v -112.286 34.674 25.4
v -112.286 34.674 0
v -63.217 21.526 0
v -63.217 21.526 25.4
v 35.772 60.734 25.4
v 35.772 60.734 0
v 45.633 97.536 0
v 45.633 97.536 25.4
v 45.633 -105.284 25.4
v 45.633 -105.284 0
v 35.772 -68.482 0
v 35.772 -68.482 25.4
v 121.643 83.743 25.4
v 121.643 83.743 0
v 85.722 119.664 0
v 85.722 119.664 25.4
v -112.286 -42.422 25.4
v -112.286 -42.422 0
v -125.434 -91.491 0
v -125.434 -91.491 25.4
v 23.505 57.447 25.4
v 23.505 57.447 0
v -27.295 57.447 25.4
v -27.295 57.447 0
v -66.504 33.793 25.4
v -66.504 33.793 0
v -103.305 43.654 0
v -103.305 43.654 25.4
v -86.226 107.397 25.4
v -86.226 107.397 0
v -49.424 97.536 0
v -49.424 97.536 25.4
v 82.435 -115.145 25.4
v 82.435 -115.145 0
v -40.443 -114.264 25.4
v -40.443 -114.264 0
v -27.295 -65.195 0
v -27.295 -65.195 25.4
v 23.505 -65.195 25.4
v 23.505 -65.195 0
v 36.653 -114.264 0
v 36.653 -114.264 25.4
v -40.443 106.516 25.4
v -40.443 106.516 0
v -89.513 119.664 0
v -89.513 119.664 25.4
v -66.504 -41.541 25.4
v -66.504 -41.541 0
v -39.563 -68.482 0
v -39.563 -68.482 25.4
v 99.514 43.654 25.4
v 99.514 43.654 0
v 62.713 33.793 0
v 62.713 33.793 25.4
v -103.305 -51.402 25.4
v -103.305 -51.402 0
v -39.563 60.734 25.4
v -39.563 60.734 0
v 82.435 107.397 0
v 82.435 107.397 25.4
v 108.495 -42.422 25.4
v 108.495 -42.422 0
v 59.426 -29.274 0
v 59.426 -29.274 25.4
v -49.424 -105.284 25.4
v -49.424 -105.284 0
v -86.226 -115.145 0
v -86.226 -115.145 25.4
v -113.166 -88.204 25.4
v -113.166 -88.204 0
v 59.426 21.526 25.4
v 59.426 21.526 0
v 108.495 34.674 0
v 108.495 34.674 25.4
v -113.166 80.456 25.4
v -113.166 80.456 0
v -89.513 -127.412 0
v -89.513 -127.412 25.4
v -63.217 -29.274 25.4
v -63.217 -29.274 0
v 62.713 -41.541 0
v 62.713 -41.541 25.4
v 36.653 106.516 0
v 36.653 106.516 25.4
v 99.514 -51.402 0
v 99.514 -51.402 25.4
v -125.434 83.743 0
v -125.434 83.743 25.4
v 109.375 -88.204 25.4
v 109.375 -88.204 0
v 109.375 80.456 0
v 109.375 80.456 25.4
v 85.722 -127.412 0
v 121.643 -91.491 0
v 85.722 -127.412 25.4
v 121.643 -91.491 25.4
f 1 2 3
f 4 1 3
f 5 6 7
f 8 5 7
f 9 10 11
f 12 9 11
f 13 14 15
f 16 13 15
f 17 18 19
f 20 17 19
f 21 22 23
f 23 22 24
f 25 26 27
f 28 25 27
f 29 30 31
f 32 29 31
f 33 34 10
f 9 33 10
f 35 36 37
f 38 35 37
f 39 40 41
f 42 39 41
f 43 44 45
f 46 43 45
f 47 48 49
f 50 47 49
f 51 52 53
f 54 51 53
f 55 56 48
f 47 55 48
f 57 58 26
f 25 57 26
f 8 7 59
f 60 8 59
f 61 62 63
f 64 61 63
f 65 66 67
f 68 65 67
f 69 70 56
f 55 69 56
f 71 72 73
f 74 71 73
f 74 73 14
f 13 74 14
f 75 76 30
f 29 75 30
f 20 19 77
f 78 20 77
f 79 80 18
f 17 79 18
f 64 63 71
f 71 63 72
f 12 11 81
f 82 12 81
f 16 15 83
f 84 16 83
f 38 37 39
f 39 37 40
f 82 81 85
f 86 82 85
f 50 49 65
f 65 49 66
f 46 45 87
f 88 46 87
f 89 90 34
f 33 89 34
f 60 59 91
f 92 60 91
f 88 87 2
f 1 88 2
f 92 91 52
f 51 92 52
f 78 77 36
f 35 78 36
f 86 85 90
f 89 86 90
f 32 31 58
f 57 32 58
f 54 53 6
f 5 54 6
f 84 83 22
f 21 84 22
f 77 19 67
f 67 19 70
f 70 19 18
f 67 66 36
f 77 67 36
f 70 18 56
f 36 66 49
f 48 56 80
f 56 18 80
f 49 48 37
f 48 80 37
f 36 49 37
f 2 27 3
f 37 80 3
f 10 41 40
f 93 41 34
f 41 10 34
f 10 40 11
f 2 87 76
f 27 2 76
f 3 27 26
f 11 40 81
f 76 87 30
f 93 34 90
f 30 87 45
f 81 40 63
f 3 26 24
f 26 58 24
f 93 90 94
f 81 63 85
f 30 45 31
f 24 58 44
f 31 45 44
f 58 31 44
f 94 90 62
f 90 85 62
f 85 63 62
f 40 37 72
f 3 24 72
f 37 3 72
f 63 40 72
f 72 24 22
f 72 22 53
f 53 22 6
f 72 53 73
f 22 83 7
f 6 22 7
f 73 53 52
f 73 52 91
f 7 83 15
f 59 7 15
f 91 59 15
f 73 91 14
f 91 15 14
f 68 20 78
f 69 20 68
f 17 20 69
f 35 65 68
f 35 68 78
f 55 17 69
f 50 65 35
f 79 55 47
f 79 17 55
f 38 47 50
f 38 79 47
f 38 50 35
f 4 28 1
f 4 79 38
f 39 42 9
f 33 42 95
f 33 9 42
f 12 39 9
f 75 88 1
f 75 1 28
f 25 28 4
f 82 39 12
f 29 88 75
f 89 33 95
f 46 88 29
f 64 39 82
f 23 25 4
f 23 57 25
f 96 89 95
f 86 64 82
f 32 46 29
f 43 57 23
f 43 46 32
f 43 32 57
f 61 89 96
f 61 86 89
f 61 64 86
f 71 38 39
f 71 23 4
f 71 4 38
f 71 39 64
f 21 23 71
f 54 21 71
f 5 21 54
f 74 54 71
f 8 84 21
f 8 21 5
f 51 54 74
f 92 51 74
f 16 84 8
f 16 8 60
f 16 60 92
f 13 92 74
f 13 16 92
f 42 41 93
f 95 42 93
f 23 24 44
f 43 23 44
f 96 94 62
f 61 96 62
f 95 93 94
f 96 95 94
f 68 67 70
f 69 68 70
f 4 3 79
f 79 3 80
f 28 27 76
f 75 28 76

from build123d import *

# Parameters (mm, degrees)
F1_DEPTH = 25.4


with BuildPart() as f1:
    # F0 (on Top) → F1 (new body)
    with BuildSketch(Plane.XY):
        Polygon((-63.21651, 21.525792), (-27.295485, 57.446817), (-40.443493, 106.515849), (-89.512525, 119.663856), (-125.433549, 83.742832), (-112.285542, 34.6738), align=None)
        Polygon((-86.225523, 107.396598), (-49.423749, 97.535593), (-39.562743, 60.733819), (-66.503511, 33.79305), (-103.305285, 43.654056), (-113.166291, 80.45583), align=None, mode=Mode.SUBTRACT)
        Polygon((59.425539, -29.274208), (59.425539, 21.525792), (23.504515, 57.446817), (-27.295485, 57.446817), (-63.21651, 21.525792), (-63.21651, -29.274208), (-27.295485, -65.195232), (23.504515, -65.195232), align=None)
        Polygon((-40.443493, -114.264264), (-27.295485, -65.195232), (-63.21651, -29.274208), (-112.285542, -42.422215), (-125.433549, -91.491247), (-89.512525, -127.412272), align=None)
        Polygon((-113.166291, -88.204245), (-103.305285, -51.402471), (-66.503511, -41.541466), (-39.562743, -68.482234), (-49.423749, -105.284008), (-86.225523, -115.145014), align=None, mode=Mode.SUBTRACT)
        Polygon((108.494571, -42.422215), (59.425539, -29.274208), (23.504515, -65.195232), (36.652522, -114.264264), (85.721554, -127.412272), (121.642579, -91.491247), align=None)
        Polygon((35.771773, -68.482234), (62.712541, -41.541466), (99.514315, -51.402471), (109.375321, -88.204245), (82.434552, -115.145014), (45.632778, -105.284008), align=None, mode=Mode.SUBTRACT)
        Polygon((23.504515, 57.446817), (59.425539, 21.525792), (108.494571, 34.6738), (121.642579, 83.742832), (85.721554, 119.663856), (36.652522, 106.515849), align=None)
        Polygon((45.632778, 97.535593), (82.434552, 107.396598), (109.375321, 80.45583), (99.514315, 43.654056), (62.712541, 33.79305), (35.771773, 60.733819), align=None, mode=Mode.SUBTRACT)
    extrude(amount=F1_DEPTH)


solid = f1.part
